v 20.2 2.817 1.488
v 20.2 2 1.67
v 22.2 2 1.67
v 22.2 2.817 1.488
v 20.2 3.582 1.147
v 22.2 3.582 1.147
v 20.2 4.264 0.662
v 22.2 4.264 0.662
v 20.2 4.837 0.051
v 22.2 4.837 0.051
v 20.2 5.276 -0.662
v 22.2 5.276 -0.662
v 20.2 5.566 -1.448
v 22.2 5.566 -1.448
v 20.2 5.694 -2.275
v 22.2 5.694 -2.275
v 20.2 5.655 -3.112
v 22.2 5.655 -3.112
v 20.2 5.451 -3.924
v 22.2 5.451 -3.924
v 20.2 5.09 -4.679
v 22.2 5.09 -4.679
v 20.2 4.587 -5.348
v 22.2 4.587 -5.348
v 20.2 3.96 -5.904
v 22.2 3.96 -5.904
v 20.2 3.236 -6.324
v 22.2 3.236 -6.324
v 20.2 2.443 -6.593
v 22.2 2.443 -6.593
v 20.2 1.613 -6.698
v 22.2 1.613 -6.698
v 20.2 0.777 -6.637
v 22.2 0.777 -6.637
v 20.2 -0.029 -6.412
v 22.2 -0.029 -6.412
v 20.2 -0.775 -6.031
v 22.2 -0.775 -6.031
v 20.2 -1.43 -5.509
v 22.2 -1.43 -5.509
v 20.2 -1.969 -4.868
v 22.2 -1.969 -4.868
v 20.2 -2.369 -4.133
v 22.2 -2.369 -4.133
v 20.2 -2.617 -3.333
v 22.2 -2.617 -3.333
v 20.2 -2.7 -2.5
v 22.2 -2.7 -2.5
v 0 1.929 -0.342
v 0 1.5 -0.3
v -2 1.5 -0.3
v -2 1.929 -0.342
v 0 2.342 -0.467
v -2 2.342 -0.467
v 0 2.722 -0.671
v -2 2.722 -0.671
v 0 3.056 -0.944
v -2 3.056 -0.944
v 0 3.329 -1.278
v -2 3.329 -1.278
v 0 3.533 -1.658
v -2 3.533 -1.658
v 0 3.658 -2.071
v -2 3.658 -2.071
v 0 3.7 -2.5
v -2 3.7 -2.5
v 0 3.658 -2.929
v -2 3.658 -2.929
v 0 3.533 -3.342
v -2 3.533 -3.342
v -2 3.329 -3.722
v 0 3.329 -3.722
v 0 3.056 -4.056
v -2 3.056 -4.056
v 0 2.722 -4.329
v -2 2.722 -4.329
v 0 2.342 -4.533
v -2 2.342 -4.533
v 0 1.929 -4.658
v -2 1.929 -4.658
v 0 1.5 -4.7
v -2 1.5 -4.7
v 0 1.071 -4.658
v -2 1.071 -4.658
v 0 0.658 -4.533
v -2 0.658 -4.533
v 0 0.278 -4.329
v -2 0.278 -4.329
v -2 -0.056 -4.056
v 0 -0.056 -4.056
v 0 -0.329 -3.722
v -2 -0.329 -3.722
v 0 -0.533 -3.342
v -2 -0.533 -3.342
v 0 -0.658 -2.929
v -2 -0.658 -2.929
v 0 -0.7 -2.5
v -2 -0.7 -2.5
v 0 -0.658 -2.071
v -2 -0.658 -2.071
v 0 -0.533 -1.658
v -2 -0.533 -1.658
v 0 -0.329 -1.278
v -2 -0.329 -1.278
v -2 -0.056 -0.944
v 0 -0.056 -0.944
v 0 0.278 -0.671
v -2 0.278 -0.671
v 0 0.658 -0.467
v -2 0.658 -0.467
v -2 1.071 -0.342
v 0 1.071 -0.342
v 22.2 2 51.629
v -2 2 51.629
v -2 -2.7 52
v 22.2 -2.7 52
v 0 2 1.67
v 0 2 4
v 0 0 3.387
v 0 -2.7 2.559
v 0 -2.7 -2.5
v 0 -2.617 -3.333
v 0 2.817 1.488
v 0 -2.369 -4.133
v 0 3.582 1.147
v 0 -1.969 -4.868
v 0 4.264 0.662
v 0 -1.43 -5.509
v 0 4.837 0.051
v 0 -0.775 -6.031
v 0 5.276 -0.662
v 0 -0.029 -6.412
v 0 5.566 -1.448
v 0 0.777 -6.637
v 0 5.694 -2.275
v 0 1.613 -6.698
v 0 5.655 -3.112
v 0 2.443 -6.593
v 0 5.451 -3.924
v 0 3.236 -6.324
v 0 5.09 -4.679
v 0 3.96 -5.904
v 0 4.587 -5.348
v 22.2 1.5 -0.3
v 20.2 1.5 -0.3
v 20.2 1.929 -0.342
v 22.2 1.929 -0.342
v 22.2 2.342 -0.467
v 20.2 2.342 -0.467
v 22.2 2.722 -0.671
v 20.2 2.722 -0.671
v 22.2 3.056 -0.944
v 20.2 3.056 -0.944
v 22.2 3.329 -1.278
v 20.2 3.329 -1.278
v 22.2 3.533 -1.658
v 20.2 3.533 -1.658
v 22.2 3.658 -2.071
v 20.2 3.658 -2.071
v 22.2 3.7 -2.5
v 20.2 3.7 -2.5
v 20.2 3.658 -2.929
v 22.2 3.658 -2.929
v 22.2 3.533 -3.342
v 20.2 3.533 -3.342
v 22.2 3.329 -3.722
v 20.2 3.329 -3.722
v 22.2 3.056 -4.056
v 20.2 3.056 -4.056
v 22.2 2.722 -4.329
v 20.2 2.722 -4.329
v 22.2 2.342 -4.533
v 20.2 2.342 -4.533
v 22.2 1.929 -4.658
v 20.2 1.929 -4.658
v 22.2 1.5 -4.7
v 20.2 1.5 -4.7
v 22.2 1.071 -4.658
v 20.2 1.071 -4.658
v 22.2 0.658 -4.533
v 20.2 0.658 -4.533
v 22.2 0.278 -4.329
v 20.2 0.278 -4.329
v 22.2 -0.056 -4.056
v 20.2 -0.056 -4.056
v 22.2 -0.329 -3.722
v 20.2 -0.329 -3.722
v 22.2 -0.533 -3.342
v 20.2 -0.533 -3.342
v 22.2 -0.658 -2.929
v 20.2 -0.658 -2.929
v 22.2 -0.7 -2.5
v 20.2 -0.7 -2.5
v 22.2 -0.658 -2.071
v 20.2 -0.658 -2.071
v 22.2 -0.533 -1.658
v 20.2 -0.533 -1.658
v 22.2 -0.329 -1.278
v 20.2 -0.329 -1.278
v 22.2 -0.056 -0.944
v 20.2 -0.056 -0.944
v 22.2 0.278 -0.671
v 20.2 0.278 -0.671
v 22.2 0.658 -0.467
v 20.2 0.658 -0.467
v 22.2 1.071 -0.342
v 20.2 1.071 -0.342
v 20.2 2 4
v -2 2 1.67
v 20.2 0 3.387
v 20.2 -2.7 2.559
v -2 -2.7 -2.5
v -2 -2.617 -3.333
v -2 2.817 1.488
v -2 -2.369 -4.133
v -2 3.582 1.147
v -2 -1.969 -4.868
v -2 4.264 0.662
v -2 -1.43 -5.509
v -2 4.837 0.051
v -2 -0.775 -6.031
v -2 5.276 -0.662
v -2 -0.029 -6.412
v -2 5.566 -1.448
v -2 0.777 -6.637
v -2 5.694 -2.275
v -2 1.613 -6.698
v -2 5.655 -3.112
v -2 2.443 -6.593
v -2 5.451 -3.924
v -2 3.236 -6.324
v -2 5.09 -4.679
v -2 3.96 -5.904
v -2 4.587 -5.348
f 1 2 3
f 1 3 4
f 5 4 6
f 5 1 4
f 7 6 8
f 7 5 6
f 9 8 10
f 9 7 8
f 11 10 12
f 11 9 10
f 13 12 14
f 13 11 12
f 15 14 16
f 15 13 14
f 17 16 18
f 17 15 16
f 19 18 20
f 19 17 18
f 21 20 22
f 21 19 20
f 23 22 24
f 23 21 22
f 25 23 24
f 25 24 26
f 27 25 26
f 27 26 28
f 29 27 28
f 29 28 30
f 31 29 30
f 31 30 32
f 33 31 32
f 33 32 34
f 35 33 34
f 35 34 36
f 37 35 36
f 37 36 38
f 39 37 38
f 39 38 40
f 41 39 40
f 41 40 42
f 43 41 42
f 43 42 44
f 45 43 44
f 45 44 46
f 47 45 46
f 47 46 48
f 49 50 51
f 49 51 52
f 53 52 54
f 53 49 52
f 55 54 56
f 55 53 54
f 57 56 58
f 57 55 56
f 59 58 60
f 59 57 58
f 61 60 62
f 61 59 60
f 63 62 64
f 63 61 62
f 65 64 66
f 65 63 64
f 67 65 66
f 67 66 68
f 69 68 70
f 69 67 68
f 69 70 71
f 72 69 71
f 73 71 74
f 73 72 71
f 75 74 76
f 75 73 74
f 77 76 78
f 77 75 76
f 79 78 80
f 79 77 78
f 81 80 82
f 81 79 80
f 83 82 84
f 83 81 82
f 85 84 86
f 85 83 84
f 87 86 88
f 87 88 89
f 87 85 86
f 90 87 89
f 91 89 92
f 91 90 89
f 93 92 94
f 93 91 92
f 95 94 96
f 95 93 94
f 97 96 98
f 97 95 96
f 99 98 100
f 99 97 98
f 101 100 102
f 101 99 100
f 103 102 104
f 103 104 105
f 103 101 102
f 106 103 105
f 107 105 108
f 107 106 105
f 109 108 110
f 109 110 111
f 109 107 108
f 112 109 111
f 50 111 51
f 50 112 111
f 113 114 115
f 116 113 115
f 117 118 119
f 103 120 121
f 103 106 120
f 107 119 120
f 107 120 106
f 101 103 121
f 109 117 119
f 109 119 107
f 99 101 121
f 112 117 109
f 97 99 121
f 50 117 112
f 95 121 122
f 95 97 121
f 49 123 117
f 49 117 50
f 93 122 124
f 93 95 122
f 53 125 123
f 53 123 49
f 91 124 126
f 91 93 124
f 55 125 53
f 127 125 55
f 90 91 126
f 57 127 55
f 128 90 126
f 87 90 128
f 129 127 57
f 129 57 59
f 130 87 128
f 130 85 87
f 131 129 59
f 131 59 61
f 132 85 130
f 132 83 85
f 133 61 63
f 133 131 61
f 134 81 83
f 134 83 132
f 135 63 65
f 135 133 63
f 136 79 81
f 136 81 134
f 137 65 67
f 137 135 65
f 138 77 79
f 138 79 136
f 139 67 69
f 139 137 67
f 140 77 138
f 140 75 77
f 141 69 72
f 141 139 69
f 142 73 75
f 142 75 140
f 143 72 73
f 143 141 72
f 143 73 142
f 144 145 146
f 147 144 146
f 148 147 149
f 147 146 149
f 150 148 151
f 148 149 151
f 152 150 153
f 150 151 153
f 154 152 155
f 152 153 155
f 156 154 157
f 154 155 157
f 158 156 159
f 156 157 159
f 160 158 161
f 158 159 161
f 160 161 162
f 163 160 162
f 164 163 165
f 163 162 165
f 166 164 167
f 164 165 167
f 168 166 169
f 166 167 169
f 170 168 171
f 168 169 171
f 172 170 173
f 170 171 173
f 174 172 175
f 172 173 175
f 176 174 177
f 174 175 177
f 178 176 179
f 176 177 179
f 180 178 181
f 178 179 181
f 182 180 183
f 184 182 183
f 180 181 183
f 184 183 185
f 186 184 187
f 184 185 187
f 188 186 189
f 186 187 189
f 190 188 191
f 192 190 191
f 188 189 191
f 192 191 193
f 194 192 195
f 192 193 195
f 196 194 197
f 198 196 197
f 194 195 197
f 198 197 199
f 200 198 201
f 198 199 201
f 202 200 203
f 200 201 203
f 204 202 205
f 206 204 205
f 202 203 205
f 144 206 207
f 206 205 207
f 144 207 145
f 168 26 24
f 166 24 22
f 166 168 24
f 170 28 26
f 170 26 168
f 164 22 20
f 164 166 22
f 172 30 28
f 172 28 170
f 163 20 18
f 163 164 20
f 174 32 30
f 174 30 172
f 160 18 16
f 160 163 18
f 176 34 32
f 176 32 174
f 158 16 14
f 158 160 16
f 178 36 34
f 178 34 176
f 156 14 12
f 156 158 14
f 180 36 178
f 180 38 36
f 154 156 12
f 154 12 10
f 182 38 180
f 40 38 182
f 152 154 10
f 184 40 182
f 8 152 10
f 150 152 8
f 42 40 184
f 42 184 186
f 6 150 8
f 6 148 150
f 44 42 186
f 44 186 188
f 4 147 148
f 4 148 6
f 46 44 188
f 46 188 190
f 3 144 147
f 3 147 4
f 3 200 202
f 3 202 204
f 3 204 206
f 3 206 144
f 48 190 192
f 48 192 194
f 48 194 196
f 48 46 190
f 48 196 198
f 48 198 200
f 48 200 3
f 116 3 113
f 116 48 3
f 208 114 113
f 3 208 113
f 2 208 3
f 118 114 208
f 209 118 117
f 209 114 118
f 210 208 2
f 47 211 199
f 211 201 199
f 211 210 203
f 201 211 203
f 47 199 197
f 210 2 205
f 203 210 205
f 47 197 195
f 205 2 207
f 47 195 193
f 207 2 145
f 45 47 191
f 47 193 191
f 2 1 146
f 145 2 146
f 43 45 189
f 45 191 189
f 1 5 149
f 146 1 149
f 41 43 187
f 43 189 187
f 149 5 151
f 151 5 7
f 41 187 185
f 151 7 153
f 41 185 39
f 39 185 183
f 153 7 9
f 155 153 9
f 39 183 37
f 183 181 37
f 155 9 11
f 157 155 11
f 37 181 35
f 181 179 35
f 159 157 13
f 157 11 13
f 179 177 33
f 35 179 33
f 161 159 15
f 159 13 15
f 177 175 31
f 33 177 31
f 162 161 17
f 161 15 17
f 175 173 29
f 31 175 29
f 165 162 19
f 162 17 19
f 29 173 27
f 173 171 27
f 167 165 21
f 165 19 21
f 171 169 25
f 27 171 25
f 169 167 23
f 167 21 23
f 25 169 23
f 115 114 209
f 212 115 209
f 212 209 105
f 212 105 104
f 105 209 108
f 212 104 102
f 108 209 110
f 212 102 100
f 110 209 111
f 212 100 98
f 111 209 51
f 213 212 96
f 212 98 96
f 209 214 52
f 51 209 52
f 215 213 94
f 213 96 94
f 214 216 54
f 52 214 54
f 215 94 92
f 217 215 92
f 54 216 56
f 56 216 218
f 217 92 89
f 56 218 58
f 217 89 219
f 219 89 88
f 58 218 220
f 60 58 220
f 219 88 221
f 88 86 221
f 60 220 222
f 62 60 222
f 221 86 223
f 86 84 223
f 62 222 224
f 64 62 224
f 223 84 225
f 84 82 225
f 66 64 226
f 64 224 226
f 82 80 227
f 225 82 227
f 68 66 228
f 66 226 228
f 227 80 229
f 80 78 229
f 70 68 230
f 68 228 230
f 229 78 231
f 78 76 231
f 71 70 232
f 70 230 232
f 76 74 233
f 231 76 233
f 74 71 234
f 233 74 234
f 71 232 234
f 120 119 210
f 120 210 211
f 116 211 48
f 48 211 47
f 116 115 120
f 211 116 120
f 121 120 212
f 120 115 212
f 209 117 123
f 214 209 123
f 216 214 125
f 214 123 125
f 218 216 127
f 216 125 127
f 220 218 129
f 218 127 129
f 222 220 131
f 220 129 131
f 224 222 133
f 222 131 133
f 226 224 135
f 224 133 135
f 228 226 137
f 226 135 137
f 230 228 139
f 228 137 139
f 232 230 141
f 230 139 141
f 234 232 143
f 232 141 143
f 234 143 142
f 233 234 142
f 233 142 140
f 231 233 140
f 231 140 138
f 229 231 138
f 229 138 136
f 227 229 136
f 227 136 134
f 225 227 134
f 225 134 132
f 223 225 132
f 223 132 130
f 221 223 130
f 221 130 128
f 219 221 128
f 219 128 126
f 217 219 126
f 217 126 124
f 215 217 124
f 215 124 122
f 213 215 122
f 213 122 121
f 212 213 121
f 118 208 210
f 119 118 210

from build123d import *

# Parameters (mm, degrees)
SKETCH_1_W          = 20.2
SKETCH_1_H          = 30
EXTRUDE_1_DEPTH     = 2
SKETCH_2_R          = 4.2
SKETCH_2_R_2        = 2.2
EXTRUDE_2_DEPTH     = 2
EXTRUDE_3_DEPTH     = 2
CUT_EXTRUDE_1_REACH = 39.616
SKETCH_4_W          = 20.2
SKETCH_4_H          = 4
EXTRUDE_4_DEPTH     = 24.2
EXTRUDE_5_DEPTH     = 20.2
EXTRUDE_6_REACH     = 64.436
CUT_EXTRUDE_2_DEPTH = 20.2
CUT_EXTRUDE_3_REACH = 64.436


with BuildPart() as part:
    # 草图1 → 凸台-拉伸1 (new body)
    with BuildSketch(Plane(origin=(0, 0, 0), x_dir=(1, 0, 0), z_dir=(0, 1, 0))):
        with Locations((10.1, -15)):
            Rectangle(SKETCH_1_W, SKETCH_1_H)
    extrude(amount=EXTRUDE_1_DEPTH)

    # 草图2 → 凸台-拉伸2 (add)
    with BuildSketch(Plane.ZY):
        with Locations(Location((-2.5, 1.5, 0), (0, 0, 339.075167572))):
            Circle(SKETCH_2_R)
        with Locations((-2.5, 1.5)):
            Circle(SKETCH_2_R_2, mode=Mode.SUBTRACT)
    extrude_2 = extrude(amount=EXTRUDE_2_DEPTH)

    # 草图3 → 凸台-拉伸3 (add)
    with BuildSketch(Plane.ZY):
        with BuildLine():
            Line((1.423009049, 0), (30, 0))
            Line((30, 0), (30, 2))
            Line((30, 2), (1.670131892, 2))
            ThreePointArc((1.670131892, 2), (1.668300922, 0.984958812), (1.423009049, 0))
        make_face()
    extrude_3 = extrude(amount=EXTRUDE_3_DEPTH)

    # 镜向1: 凸台-拉伸2, 凸台-拉伸3 across plane
    add(extrude_2.mirror(Plane(origin=(10.1, 0, 0), x_dir=(0, 0, 1), z_dir=(1, 0, 0))))
    add(extrude_3.mirror(Plane(origin=(10.1, 0, 0), x_dir=(0, 0, 1), z_dir=(1, 0, 0))))

    # 草图4 → 切除-拉伸1 (cut, up to next)
    with BuildSketch(Plane(origin=(0, 2, 0), x_dir=(1, 0, 0), z_dir=(0, 1, 0)), mode=Mode.PRIVATE) as cut_extrude_1_sk1:
        with Locations((10.1, -2)):
            Rectangle(SKETCH_4_W, SKETCH_4_H)
    cut_extrude_1_tool1 = extrude(cut_extrude_1_sk1.sketch, amount=-CUT_EXTRUDE_1_REACH, mode=Mode.PRIVATE) & part.part
    add(cut_extrude_1_tool1.solids().sort_by_distance((10.1, 2, 2))[0], mode=Mode.SUBTRACT)

    # 草图7 → 凸台-拉伸4 (add)
    with BuildSketch(Plane.ZY.offset(2)):
        Polygon((30, 0), (56.65925637, 0), (57.272485309, 2), (30, 2), align=None)
    extrude(amount=-EXTRUDE_4_DEPTH)

    # 草图8 → 凸台-拉伸5 (add)
    with BuildSketch(Plane.ZY.offset(-20.2)):
        Polygon((4, 2), (3.386771061, 0), (4, 0), align=None)
    extrude(amount=EXTRUDE_5_DEPTH)

    # 凸台-拉伸6: up to this face of the body (flat: up to its plane)
    extrude_6_end = Plane(part.part.faces().sort_by_distance((22.2, 1.134069843, 20.823377478))[0])
    # 草图10 → 凸台-拉伸6 (add, up to the picked face)
    with BuildSketch(Plane.ZY.offset(2), mode=Mode.PRIVATE) as extrude_6_sk1:
        with BuildLine():
            Line((56.65925637, 0), (55.831397303, -2.7))
            Line((55.831397303, -2.7), (-2.5, -2.7))
            ThreePointArc((-2.5, -2.7), (-0.11882382, -1.959768778), (1.423009049, 0))
            Line((1.423009049, 0), (56.65925637, 0))
        make_face()
    extrude_6_tool1 = split(extrude(extrude_6_sk1.sketch, amount=-EXTRUDE_6_REACH, mode=Mode.PRIVATE), bisect_by=extrude_6_end, keep=Keep.BOTH, mode=Mode.PRIVATE)
    add(extrude_6_tool1.solids().sort_by(Axis((-2, -1.358557, 28.290322), (1, 0, 0)))[0])

    # 草图11 → 切除-拉伸2 (cut)
    with BuildSketch(Plane.ZY.offset(-20.2)):
        Polygon((3.386771061, 0), (2.558911994, -2.7), (-2.5, -2.7), (1.423009049, 0), align=None)
    extrude(amount=CUT_EXTRUDE_2_DEPTH, mode=Mode.SUBTRACT)

    # 草图15 → 切除-拉伸3 (cut, up to next)
    with BuildSketch(Plane.ZY.offset(2), mode=Mode.PRIVATE) as cut_extrude_3_sk1:
        Polygon((51.628649906, 2), (51.999830908, -2.7), (55.831397303, -2.7), (57.272485309, 2), align=None)
    cut_extrude_3_tool1 = extrude(cut_extrude_3_sk1.sketch, amount=-CUT_EXTRUDE_3_REACH, mode=Mode.PRIVATE) & part.part
    add(cut_extrude_3_tool1.solids().sort_by_distance((-2, -0.200179, 54.200143))[0], mode=Mode.SUBTRACT)


solid = part.part
